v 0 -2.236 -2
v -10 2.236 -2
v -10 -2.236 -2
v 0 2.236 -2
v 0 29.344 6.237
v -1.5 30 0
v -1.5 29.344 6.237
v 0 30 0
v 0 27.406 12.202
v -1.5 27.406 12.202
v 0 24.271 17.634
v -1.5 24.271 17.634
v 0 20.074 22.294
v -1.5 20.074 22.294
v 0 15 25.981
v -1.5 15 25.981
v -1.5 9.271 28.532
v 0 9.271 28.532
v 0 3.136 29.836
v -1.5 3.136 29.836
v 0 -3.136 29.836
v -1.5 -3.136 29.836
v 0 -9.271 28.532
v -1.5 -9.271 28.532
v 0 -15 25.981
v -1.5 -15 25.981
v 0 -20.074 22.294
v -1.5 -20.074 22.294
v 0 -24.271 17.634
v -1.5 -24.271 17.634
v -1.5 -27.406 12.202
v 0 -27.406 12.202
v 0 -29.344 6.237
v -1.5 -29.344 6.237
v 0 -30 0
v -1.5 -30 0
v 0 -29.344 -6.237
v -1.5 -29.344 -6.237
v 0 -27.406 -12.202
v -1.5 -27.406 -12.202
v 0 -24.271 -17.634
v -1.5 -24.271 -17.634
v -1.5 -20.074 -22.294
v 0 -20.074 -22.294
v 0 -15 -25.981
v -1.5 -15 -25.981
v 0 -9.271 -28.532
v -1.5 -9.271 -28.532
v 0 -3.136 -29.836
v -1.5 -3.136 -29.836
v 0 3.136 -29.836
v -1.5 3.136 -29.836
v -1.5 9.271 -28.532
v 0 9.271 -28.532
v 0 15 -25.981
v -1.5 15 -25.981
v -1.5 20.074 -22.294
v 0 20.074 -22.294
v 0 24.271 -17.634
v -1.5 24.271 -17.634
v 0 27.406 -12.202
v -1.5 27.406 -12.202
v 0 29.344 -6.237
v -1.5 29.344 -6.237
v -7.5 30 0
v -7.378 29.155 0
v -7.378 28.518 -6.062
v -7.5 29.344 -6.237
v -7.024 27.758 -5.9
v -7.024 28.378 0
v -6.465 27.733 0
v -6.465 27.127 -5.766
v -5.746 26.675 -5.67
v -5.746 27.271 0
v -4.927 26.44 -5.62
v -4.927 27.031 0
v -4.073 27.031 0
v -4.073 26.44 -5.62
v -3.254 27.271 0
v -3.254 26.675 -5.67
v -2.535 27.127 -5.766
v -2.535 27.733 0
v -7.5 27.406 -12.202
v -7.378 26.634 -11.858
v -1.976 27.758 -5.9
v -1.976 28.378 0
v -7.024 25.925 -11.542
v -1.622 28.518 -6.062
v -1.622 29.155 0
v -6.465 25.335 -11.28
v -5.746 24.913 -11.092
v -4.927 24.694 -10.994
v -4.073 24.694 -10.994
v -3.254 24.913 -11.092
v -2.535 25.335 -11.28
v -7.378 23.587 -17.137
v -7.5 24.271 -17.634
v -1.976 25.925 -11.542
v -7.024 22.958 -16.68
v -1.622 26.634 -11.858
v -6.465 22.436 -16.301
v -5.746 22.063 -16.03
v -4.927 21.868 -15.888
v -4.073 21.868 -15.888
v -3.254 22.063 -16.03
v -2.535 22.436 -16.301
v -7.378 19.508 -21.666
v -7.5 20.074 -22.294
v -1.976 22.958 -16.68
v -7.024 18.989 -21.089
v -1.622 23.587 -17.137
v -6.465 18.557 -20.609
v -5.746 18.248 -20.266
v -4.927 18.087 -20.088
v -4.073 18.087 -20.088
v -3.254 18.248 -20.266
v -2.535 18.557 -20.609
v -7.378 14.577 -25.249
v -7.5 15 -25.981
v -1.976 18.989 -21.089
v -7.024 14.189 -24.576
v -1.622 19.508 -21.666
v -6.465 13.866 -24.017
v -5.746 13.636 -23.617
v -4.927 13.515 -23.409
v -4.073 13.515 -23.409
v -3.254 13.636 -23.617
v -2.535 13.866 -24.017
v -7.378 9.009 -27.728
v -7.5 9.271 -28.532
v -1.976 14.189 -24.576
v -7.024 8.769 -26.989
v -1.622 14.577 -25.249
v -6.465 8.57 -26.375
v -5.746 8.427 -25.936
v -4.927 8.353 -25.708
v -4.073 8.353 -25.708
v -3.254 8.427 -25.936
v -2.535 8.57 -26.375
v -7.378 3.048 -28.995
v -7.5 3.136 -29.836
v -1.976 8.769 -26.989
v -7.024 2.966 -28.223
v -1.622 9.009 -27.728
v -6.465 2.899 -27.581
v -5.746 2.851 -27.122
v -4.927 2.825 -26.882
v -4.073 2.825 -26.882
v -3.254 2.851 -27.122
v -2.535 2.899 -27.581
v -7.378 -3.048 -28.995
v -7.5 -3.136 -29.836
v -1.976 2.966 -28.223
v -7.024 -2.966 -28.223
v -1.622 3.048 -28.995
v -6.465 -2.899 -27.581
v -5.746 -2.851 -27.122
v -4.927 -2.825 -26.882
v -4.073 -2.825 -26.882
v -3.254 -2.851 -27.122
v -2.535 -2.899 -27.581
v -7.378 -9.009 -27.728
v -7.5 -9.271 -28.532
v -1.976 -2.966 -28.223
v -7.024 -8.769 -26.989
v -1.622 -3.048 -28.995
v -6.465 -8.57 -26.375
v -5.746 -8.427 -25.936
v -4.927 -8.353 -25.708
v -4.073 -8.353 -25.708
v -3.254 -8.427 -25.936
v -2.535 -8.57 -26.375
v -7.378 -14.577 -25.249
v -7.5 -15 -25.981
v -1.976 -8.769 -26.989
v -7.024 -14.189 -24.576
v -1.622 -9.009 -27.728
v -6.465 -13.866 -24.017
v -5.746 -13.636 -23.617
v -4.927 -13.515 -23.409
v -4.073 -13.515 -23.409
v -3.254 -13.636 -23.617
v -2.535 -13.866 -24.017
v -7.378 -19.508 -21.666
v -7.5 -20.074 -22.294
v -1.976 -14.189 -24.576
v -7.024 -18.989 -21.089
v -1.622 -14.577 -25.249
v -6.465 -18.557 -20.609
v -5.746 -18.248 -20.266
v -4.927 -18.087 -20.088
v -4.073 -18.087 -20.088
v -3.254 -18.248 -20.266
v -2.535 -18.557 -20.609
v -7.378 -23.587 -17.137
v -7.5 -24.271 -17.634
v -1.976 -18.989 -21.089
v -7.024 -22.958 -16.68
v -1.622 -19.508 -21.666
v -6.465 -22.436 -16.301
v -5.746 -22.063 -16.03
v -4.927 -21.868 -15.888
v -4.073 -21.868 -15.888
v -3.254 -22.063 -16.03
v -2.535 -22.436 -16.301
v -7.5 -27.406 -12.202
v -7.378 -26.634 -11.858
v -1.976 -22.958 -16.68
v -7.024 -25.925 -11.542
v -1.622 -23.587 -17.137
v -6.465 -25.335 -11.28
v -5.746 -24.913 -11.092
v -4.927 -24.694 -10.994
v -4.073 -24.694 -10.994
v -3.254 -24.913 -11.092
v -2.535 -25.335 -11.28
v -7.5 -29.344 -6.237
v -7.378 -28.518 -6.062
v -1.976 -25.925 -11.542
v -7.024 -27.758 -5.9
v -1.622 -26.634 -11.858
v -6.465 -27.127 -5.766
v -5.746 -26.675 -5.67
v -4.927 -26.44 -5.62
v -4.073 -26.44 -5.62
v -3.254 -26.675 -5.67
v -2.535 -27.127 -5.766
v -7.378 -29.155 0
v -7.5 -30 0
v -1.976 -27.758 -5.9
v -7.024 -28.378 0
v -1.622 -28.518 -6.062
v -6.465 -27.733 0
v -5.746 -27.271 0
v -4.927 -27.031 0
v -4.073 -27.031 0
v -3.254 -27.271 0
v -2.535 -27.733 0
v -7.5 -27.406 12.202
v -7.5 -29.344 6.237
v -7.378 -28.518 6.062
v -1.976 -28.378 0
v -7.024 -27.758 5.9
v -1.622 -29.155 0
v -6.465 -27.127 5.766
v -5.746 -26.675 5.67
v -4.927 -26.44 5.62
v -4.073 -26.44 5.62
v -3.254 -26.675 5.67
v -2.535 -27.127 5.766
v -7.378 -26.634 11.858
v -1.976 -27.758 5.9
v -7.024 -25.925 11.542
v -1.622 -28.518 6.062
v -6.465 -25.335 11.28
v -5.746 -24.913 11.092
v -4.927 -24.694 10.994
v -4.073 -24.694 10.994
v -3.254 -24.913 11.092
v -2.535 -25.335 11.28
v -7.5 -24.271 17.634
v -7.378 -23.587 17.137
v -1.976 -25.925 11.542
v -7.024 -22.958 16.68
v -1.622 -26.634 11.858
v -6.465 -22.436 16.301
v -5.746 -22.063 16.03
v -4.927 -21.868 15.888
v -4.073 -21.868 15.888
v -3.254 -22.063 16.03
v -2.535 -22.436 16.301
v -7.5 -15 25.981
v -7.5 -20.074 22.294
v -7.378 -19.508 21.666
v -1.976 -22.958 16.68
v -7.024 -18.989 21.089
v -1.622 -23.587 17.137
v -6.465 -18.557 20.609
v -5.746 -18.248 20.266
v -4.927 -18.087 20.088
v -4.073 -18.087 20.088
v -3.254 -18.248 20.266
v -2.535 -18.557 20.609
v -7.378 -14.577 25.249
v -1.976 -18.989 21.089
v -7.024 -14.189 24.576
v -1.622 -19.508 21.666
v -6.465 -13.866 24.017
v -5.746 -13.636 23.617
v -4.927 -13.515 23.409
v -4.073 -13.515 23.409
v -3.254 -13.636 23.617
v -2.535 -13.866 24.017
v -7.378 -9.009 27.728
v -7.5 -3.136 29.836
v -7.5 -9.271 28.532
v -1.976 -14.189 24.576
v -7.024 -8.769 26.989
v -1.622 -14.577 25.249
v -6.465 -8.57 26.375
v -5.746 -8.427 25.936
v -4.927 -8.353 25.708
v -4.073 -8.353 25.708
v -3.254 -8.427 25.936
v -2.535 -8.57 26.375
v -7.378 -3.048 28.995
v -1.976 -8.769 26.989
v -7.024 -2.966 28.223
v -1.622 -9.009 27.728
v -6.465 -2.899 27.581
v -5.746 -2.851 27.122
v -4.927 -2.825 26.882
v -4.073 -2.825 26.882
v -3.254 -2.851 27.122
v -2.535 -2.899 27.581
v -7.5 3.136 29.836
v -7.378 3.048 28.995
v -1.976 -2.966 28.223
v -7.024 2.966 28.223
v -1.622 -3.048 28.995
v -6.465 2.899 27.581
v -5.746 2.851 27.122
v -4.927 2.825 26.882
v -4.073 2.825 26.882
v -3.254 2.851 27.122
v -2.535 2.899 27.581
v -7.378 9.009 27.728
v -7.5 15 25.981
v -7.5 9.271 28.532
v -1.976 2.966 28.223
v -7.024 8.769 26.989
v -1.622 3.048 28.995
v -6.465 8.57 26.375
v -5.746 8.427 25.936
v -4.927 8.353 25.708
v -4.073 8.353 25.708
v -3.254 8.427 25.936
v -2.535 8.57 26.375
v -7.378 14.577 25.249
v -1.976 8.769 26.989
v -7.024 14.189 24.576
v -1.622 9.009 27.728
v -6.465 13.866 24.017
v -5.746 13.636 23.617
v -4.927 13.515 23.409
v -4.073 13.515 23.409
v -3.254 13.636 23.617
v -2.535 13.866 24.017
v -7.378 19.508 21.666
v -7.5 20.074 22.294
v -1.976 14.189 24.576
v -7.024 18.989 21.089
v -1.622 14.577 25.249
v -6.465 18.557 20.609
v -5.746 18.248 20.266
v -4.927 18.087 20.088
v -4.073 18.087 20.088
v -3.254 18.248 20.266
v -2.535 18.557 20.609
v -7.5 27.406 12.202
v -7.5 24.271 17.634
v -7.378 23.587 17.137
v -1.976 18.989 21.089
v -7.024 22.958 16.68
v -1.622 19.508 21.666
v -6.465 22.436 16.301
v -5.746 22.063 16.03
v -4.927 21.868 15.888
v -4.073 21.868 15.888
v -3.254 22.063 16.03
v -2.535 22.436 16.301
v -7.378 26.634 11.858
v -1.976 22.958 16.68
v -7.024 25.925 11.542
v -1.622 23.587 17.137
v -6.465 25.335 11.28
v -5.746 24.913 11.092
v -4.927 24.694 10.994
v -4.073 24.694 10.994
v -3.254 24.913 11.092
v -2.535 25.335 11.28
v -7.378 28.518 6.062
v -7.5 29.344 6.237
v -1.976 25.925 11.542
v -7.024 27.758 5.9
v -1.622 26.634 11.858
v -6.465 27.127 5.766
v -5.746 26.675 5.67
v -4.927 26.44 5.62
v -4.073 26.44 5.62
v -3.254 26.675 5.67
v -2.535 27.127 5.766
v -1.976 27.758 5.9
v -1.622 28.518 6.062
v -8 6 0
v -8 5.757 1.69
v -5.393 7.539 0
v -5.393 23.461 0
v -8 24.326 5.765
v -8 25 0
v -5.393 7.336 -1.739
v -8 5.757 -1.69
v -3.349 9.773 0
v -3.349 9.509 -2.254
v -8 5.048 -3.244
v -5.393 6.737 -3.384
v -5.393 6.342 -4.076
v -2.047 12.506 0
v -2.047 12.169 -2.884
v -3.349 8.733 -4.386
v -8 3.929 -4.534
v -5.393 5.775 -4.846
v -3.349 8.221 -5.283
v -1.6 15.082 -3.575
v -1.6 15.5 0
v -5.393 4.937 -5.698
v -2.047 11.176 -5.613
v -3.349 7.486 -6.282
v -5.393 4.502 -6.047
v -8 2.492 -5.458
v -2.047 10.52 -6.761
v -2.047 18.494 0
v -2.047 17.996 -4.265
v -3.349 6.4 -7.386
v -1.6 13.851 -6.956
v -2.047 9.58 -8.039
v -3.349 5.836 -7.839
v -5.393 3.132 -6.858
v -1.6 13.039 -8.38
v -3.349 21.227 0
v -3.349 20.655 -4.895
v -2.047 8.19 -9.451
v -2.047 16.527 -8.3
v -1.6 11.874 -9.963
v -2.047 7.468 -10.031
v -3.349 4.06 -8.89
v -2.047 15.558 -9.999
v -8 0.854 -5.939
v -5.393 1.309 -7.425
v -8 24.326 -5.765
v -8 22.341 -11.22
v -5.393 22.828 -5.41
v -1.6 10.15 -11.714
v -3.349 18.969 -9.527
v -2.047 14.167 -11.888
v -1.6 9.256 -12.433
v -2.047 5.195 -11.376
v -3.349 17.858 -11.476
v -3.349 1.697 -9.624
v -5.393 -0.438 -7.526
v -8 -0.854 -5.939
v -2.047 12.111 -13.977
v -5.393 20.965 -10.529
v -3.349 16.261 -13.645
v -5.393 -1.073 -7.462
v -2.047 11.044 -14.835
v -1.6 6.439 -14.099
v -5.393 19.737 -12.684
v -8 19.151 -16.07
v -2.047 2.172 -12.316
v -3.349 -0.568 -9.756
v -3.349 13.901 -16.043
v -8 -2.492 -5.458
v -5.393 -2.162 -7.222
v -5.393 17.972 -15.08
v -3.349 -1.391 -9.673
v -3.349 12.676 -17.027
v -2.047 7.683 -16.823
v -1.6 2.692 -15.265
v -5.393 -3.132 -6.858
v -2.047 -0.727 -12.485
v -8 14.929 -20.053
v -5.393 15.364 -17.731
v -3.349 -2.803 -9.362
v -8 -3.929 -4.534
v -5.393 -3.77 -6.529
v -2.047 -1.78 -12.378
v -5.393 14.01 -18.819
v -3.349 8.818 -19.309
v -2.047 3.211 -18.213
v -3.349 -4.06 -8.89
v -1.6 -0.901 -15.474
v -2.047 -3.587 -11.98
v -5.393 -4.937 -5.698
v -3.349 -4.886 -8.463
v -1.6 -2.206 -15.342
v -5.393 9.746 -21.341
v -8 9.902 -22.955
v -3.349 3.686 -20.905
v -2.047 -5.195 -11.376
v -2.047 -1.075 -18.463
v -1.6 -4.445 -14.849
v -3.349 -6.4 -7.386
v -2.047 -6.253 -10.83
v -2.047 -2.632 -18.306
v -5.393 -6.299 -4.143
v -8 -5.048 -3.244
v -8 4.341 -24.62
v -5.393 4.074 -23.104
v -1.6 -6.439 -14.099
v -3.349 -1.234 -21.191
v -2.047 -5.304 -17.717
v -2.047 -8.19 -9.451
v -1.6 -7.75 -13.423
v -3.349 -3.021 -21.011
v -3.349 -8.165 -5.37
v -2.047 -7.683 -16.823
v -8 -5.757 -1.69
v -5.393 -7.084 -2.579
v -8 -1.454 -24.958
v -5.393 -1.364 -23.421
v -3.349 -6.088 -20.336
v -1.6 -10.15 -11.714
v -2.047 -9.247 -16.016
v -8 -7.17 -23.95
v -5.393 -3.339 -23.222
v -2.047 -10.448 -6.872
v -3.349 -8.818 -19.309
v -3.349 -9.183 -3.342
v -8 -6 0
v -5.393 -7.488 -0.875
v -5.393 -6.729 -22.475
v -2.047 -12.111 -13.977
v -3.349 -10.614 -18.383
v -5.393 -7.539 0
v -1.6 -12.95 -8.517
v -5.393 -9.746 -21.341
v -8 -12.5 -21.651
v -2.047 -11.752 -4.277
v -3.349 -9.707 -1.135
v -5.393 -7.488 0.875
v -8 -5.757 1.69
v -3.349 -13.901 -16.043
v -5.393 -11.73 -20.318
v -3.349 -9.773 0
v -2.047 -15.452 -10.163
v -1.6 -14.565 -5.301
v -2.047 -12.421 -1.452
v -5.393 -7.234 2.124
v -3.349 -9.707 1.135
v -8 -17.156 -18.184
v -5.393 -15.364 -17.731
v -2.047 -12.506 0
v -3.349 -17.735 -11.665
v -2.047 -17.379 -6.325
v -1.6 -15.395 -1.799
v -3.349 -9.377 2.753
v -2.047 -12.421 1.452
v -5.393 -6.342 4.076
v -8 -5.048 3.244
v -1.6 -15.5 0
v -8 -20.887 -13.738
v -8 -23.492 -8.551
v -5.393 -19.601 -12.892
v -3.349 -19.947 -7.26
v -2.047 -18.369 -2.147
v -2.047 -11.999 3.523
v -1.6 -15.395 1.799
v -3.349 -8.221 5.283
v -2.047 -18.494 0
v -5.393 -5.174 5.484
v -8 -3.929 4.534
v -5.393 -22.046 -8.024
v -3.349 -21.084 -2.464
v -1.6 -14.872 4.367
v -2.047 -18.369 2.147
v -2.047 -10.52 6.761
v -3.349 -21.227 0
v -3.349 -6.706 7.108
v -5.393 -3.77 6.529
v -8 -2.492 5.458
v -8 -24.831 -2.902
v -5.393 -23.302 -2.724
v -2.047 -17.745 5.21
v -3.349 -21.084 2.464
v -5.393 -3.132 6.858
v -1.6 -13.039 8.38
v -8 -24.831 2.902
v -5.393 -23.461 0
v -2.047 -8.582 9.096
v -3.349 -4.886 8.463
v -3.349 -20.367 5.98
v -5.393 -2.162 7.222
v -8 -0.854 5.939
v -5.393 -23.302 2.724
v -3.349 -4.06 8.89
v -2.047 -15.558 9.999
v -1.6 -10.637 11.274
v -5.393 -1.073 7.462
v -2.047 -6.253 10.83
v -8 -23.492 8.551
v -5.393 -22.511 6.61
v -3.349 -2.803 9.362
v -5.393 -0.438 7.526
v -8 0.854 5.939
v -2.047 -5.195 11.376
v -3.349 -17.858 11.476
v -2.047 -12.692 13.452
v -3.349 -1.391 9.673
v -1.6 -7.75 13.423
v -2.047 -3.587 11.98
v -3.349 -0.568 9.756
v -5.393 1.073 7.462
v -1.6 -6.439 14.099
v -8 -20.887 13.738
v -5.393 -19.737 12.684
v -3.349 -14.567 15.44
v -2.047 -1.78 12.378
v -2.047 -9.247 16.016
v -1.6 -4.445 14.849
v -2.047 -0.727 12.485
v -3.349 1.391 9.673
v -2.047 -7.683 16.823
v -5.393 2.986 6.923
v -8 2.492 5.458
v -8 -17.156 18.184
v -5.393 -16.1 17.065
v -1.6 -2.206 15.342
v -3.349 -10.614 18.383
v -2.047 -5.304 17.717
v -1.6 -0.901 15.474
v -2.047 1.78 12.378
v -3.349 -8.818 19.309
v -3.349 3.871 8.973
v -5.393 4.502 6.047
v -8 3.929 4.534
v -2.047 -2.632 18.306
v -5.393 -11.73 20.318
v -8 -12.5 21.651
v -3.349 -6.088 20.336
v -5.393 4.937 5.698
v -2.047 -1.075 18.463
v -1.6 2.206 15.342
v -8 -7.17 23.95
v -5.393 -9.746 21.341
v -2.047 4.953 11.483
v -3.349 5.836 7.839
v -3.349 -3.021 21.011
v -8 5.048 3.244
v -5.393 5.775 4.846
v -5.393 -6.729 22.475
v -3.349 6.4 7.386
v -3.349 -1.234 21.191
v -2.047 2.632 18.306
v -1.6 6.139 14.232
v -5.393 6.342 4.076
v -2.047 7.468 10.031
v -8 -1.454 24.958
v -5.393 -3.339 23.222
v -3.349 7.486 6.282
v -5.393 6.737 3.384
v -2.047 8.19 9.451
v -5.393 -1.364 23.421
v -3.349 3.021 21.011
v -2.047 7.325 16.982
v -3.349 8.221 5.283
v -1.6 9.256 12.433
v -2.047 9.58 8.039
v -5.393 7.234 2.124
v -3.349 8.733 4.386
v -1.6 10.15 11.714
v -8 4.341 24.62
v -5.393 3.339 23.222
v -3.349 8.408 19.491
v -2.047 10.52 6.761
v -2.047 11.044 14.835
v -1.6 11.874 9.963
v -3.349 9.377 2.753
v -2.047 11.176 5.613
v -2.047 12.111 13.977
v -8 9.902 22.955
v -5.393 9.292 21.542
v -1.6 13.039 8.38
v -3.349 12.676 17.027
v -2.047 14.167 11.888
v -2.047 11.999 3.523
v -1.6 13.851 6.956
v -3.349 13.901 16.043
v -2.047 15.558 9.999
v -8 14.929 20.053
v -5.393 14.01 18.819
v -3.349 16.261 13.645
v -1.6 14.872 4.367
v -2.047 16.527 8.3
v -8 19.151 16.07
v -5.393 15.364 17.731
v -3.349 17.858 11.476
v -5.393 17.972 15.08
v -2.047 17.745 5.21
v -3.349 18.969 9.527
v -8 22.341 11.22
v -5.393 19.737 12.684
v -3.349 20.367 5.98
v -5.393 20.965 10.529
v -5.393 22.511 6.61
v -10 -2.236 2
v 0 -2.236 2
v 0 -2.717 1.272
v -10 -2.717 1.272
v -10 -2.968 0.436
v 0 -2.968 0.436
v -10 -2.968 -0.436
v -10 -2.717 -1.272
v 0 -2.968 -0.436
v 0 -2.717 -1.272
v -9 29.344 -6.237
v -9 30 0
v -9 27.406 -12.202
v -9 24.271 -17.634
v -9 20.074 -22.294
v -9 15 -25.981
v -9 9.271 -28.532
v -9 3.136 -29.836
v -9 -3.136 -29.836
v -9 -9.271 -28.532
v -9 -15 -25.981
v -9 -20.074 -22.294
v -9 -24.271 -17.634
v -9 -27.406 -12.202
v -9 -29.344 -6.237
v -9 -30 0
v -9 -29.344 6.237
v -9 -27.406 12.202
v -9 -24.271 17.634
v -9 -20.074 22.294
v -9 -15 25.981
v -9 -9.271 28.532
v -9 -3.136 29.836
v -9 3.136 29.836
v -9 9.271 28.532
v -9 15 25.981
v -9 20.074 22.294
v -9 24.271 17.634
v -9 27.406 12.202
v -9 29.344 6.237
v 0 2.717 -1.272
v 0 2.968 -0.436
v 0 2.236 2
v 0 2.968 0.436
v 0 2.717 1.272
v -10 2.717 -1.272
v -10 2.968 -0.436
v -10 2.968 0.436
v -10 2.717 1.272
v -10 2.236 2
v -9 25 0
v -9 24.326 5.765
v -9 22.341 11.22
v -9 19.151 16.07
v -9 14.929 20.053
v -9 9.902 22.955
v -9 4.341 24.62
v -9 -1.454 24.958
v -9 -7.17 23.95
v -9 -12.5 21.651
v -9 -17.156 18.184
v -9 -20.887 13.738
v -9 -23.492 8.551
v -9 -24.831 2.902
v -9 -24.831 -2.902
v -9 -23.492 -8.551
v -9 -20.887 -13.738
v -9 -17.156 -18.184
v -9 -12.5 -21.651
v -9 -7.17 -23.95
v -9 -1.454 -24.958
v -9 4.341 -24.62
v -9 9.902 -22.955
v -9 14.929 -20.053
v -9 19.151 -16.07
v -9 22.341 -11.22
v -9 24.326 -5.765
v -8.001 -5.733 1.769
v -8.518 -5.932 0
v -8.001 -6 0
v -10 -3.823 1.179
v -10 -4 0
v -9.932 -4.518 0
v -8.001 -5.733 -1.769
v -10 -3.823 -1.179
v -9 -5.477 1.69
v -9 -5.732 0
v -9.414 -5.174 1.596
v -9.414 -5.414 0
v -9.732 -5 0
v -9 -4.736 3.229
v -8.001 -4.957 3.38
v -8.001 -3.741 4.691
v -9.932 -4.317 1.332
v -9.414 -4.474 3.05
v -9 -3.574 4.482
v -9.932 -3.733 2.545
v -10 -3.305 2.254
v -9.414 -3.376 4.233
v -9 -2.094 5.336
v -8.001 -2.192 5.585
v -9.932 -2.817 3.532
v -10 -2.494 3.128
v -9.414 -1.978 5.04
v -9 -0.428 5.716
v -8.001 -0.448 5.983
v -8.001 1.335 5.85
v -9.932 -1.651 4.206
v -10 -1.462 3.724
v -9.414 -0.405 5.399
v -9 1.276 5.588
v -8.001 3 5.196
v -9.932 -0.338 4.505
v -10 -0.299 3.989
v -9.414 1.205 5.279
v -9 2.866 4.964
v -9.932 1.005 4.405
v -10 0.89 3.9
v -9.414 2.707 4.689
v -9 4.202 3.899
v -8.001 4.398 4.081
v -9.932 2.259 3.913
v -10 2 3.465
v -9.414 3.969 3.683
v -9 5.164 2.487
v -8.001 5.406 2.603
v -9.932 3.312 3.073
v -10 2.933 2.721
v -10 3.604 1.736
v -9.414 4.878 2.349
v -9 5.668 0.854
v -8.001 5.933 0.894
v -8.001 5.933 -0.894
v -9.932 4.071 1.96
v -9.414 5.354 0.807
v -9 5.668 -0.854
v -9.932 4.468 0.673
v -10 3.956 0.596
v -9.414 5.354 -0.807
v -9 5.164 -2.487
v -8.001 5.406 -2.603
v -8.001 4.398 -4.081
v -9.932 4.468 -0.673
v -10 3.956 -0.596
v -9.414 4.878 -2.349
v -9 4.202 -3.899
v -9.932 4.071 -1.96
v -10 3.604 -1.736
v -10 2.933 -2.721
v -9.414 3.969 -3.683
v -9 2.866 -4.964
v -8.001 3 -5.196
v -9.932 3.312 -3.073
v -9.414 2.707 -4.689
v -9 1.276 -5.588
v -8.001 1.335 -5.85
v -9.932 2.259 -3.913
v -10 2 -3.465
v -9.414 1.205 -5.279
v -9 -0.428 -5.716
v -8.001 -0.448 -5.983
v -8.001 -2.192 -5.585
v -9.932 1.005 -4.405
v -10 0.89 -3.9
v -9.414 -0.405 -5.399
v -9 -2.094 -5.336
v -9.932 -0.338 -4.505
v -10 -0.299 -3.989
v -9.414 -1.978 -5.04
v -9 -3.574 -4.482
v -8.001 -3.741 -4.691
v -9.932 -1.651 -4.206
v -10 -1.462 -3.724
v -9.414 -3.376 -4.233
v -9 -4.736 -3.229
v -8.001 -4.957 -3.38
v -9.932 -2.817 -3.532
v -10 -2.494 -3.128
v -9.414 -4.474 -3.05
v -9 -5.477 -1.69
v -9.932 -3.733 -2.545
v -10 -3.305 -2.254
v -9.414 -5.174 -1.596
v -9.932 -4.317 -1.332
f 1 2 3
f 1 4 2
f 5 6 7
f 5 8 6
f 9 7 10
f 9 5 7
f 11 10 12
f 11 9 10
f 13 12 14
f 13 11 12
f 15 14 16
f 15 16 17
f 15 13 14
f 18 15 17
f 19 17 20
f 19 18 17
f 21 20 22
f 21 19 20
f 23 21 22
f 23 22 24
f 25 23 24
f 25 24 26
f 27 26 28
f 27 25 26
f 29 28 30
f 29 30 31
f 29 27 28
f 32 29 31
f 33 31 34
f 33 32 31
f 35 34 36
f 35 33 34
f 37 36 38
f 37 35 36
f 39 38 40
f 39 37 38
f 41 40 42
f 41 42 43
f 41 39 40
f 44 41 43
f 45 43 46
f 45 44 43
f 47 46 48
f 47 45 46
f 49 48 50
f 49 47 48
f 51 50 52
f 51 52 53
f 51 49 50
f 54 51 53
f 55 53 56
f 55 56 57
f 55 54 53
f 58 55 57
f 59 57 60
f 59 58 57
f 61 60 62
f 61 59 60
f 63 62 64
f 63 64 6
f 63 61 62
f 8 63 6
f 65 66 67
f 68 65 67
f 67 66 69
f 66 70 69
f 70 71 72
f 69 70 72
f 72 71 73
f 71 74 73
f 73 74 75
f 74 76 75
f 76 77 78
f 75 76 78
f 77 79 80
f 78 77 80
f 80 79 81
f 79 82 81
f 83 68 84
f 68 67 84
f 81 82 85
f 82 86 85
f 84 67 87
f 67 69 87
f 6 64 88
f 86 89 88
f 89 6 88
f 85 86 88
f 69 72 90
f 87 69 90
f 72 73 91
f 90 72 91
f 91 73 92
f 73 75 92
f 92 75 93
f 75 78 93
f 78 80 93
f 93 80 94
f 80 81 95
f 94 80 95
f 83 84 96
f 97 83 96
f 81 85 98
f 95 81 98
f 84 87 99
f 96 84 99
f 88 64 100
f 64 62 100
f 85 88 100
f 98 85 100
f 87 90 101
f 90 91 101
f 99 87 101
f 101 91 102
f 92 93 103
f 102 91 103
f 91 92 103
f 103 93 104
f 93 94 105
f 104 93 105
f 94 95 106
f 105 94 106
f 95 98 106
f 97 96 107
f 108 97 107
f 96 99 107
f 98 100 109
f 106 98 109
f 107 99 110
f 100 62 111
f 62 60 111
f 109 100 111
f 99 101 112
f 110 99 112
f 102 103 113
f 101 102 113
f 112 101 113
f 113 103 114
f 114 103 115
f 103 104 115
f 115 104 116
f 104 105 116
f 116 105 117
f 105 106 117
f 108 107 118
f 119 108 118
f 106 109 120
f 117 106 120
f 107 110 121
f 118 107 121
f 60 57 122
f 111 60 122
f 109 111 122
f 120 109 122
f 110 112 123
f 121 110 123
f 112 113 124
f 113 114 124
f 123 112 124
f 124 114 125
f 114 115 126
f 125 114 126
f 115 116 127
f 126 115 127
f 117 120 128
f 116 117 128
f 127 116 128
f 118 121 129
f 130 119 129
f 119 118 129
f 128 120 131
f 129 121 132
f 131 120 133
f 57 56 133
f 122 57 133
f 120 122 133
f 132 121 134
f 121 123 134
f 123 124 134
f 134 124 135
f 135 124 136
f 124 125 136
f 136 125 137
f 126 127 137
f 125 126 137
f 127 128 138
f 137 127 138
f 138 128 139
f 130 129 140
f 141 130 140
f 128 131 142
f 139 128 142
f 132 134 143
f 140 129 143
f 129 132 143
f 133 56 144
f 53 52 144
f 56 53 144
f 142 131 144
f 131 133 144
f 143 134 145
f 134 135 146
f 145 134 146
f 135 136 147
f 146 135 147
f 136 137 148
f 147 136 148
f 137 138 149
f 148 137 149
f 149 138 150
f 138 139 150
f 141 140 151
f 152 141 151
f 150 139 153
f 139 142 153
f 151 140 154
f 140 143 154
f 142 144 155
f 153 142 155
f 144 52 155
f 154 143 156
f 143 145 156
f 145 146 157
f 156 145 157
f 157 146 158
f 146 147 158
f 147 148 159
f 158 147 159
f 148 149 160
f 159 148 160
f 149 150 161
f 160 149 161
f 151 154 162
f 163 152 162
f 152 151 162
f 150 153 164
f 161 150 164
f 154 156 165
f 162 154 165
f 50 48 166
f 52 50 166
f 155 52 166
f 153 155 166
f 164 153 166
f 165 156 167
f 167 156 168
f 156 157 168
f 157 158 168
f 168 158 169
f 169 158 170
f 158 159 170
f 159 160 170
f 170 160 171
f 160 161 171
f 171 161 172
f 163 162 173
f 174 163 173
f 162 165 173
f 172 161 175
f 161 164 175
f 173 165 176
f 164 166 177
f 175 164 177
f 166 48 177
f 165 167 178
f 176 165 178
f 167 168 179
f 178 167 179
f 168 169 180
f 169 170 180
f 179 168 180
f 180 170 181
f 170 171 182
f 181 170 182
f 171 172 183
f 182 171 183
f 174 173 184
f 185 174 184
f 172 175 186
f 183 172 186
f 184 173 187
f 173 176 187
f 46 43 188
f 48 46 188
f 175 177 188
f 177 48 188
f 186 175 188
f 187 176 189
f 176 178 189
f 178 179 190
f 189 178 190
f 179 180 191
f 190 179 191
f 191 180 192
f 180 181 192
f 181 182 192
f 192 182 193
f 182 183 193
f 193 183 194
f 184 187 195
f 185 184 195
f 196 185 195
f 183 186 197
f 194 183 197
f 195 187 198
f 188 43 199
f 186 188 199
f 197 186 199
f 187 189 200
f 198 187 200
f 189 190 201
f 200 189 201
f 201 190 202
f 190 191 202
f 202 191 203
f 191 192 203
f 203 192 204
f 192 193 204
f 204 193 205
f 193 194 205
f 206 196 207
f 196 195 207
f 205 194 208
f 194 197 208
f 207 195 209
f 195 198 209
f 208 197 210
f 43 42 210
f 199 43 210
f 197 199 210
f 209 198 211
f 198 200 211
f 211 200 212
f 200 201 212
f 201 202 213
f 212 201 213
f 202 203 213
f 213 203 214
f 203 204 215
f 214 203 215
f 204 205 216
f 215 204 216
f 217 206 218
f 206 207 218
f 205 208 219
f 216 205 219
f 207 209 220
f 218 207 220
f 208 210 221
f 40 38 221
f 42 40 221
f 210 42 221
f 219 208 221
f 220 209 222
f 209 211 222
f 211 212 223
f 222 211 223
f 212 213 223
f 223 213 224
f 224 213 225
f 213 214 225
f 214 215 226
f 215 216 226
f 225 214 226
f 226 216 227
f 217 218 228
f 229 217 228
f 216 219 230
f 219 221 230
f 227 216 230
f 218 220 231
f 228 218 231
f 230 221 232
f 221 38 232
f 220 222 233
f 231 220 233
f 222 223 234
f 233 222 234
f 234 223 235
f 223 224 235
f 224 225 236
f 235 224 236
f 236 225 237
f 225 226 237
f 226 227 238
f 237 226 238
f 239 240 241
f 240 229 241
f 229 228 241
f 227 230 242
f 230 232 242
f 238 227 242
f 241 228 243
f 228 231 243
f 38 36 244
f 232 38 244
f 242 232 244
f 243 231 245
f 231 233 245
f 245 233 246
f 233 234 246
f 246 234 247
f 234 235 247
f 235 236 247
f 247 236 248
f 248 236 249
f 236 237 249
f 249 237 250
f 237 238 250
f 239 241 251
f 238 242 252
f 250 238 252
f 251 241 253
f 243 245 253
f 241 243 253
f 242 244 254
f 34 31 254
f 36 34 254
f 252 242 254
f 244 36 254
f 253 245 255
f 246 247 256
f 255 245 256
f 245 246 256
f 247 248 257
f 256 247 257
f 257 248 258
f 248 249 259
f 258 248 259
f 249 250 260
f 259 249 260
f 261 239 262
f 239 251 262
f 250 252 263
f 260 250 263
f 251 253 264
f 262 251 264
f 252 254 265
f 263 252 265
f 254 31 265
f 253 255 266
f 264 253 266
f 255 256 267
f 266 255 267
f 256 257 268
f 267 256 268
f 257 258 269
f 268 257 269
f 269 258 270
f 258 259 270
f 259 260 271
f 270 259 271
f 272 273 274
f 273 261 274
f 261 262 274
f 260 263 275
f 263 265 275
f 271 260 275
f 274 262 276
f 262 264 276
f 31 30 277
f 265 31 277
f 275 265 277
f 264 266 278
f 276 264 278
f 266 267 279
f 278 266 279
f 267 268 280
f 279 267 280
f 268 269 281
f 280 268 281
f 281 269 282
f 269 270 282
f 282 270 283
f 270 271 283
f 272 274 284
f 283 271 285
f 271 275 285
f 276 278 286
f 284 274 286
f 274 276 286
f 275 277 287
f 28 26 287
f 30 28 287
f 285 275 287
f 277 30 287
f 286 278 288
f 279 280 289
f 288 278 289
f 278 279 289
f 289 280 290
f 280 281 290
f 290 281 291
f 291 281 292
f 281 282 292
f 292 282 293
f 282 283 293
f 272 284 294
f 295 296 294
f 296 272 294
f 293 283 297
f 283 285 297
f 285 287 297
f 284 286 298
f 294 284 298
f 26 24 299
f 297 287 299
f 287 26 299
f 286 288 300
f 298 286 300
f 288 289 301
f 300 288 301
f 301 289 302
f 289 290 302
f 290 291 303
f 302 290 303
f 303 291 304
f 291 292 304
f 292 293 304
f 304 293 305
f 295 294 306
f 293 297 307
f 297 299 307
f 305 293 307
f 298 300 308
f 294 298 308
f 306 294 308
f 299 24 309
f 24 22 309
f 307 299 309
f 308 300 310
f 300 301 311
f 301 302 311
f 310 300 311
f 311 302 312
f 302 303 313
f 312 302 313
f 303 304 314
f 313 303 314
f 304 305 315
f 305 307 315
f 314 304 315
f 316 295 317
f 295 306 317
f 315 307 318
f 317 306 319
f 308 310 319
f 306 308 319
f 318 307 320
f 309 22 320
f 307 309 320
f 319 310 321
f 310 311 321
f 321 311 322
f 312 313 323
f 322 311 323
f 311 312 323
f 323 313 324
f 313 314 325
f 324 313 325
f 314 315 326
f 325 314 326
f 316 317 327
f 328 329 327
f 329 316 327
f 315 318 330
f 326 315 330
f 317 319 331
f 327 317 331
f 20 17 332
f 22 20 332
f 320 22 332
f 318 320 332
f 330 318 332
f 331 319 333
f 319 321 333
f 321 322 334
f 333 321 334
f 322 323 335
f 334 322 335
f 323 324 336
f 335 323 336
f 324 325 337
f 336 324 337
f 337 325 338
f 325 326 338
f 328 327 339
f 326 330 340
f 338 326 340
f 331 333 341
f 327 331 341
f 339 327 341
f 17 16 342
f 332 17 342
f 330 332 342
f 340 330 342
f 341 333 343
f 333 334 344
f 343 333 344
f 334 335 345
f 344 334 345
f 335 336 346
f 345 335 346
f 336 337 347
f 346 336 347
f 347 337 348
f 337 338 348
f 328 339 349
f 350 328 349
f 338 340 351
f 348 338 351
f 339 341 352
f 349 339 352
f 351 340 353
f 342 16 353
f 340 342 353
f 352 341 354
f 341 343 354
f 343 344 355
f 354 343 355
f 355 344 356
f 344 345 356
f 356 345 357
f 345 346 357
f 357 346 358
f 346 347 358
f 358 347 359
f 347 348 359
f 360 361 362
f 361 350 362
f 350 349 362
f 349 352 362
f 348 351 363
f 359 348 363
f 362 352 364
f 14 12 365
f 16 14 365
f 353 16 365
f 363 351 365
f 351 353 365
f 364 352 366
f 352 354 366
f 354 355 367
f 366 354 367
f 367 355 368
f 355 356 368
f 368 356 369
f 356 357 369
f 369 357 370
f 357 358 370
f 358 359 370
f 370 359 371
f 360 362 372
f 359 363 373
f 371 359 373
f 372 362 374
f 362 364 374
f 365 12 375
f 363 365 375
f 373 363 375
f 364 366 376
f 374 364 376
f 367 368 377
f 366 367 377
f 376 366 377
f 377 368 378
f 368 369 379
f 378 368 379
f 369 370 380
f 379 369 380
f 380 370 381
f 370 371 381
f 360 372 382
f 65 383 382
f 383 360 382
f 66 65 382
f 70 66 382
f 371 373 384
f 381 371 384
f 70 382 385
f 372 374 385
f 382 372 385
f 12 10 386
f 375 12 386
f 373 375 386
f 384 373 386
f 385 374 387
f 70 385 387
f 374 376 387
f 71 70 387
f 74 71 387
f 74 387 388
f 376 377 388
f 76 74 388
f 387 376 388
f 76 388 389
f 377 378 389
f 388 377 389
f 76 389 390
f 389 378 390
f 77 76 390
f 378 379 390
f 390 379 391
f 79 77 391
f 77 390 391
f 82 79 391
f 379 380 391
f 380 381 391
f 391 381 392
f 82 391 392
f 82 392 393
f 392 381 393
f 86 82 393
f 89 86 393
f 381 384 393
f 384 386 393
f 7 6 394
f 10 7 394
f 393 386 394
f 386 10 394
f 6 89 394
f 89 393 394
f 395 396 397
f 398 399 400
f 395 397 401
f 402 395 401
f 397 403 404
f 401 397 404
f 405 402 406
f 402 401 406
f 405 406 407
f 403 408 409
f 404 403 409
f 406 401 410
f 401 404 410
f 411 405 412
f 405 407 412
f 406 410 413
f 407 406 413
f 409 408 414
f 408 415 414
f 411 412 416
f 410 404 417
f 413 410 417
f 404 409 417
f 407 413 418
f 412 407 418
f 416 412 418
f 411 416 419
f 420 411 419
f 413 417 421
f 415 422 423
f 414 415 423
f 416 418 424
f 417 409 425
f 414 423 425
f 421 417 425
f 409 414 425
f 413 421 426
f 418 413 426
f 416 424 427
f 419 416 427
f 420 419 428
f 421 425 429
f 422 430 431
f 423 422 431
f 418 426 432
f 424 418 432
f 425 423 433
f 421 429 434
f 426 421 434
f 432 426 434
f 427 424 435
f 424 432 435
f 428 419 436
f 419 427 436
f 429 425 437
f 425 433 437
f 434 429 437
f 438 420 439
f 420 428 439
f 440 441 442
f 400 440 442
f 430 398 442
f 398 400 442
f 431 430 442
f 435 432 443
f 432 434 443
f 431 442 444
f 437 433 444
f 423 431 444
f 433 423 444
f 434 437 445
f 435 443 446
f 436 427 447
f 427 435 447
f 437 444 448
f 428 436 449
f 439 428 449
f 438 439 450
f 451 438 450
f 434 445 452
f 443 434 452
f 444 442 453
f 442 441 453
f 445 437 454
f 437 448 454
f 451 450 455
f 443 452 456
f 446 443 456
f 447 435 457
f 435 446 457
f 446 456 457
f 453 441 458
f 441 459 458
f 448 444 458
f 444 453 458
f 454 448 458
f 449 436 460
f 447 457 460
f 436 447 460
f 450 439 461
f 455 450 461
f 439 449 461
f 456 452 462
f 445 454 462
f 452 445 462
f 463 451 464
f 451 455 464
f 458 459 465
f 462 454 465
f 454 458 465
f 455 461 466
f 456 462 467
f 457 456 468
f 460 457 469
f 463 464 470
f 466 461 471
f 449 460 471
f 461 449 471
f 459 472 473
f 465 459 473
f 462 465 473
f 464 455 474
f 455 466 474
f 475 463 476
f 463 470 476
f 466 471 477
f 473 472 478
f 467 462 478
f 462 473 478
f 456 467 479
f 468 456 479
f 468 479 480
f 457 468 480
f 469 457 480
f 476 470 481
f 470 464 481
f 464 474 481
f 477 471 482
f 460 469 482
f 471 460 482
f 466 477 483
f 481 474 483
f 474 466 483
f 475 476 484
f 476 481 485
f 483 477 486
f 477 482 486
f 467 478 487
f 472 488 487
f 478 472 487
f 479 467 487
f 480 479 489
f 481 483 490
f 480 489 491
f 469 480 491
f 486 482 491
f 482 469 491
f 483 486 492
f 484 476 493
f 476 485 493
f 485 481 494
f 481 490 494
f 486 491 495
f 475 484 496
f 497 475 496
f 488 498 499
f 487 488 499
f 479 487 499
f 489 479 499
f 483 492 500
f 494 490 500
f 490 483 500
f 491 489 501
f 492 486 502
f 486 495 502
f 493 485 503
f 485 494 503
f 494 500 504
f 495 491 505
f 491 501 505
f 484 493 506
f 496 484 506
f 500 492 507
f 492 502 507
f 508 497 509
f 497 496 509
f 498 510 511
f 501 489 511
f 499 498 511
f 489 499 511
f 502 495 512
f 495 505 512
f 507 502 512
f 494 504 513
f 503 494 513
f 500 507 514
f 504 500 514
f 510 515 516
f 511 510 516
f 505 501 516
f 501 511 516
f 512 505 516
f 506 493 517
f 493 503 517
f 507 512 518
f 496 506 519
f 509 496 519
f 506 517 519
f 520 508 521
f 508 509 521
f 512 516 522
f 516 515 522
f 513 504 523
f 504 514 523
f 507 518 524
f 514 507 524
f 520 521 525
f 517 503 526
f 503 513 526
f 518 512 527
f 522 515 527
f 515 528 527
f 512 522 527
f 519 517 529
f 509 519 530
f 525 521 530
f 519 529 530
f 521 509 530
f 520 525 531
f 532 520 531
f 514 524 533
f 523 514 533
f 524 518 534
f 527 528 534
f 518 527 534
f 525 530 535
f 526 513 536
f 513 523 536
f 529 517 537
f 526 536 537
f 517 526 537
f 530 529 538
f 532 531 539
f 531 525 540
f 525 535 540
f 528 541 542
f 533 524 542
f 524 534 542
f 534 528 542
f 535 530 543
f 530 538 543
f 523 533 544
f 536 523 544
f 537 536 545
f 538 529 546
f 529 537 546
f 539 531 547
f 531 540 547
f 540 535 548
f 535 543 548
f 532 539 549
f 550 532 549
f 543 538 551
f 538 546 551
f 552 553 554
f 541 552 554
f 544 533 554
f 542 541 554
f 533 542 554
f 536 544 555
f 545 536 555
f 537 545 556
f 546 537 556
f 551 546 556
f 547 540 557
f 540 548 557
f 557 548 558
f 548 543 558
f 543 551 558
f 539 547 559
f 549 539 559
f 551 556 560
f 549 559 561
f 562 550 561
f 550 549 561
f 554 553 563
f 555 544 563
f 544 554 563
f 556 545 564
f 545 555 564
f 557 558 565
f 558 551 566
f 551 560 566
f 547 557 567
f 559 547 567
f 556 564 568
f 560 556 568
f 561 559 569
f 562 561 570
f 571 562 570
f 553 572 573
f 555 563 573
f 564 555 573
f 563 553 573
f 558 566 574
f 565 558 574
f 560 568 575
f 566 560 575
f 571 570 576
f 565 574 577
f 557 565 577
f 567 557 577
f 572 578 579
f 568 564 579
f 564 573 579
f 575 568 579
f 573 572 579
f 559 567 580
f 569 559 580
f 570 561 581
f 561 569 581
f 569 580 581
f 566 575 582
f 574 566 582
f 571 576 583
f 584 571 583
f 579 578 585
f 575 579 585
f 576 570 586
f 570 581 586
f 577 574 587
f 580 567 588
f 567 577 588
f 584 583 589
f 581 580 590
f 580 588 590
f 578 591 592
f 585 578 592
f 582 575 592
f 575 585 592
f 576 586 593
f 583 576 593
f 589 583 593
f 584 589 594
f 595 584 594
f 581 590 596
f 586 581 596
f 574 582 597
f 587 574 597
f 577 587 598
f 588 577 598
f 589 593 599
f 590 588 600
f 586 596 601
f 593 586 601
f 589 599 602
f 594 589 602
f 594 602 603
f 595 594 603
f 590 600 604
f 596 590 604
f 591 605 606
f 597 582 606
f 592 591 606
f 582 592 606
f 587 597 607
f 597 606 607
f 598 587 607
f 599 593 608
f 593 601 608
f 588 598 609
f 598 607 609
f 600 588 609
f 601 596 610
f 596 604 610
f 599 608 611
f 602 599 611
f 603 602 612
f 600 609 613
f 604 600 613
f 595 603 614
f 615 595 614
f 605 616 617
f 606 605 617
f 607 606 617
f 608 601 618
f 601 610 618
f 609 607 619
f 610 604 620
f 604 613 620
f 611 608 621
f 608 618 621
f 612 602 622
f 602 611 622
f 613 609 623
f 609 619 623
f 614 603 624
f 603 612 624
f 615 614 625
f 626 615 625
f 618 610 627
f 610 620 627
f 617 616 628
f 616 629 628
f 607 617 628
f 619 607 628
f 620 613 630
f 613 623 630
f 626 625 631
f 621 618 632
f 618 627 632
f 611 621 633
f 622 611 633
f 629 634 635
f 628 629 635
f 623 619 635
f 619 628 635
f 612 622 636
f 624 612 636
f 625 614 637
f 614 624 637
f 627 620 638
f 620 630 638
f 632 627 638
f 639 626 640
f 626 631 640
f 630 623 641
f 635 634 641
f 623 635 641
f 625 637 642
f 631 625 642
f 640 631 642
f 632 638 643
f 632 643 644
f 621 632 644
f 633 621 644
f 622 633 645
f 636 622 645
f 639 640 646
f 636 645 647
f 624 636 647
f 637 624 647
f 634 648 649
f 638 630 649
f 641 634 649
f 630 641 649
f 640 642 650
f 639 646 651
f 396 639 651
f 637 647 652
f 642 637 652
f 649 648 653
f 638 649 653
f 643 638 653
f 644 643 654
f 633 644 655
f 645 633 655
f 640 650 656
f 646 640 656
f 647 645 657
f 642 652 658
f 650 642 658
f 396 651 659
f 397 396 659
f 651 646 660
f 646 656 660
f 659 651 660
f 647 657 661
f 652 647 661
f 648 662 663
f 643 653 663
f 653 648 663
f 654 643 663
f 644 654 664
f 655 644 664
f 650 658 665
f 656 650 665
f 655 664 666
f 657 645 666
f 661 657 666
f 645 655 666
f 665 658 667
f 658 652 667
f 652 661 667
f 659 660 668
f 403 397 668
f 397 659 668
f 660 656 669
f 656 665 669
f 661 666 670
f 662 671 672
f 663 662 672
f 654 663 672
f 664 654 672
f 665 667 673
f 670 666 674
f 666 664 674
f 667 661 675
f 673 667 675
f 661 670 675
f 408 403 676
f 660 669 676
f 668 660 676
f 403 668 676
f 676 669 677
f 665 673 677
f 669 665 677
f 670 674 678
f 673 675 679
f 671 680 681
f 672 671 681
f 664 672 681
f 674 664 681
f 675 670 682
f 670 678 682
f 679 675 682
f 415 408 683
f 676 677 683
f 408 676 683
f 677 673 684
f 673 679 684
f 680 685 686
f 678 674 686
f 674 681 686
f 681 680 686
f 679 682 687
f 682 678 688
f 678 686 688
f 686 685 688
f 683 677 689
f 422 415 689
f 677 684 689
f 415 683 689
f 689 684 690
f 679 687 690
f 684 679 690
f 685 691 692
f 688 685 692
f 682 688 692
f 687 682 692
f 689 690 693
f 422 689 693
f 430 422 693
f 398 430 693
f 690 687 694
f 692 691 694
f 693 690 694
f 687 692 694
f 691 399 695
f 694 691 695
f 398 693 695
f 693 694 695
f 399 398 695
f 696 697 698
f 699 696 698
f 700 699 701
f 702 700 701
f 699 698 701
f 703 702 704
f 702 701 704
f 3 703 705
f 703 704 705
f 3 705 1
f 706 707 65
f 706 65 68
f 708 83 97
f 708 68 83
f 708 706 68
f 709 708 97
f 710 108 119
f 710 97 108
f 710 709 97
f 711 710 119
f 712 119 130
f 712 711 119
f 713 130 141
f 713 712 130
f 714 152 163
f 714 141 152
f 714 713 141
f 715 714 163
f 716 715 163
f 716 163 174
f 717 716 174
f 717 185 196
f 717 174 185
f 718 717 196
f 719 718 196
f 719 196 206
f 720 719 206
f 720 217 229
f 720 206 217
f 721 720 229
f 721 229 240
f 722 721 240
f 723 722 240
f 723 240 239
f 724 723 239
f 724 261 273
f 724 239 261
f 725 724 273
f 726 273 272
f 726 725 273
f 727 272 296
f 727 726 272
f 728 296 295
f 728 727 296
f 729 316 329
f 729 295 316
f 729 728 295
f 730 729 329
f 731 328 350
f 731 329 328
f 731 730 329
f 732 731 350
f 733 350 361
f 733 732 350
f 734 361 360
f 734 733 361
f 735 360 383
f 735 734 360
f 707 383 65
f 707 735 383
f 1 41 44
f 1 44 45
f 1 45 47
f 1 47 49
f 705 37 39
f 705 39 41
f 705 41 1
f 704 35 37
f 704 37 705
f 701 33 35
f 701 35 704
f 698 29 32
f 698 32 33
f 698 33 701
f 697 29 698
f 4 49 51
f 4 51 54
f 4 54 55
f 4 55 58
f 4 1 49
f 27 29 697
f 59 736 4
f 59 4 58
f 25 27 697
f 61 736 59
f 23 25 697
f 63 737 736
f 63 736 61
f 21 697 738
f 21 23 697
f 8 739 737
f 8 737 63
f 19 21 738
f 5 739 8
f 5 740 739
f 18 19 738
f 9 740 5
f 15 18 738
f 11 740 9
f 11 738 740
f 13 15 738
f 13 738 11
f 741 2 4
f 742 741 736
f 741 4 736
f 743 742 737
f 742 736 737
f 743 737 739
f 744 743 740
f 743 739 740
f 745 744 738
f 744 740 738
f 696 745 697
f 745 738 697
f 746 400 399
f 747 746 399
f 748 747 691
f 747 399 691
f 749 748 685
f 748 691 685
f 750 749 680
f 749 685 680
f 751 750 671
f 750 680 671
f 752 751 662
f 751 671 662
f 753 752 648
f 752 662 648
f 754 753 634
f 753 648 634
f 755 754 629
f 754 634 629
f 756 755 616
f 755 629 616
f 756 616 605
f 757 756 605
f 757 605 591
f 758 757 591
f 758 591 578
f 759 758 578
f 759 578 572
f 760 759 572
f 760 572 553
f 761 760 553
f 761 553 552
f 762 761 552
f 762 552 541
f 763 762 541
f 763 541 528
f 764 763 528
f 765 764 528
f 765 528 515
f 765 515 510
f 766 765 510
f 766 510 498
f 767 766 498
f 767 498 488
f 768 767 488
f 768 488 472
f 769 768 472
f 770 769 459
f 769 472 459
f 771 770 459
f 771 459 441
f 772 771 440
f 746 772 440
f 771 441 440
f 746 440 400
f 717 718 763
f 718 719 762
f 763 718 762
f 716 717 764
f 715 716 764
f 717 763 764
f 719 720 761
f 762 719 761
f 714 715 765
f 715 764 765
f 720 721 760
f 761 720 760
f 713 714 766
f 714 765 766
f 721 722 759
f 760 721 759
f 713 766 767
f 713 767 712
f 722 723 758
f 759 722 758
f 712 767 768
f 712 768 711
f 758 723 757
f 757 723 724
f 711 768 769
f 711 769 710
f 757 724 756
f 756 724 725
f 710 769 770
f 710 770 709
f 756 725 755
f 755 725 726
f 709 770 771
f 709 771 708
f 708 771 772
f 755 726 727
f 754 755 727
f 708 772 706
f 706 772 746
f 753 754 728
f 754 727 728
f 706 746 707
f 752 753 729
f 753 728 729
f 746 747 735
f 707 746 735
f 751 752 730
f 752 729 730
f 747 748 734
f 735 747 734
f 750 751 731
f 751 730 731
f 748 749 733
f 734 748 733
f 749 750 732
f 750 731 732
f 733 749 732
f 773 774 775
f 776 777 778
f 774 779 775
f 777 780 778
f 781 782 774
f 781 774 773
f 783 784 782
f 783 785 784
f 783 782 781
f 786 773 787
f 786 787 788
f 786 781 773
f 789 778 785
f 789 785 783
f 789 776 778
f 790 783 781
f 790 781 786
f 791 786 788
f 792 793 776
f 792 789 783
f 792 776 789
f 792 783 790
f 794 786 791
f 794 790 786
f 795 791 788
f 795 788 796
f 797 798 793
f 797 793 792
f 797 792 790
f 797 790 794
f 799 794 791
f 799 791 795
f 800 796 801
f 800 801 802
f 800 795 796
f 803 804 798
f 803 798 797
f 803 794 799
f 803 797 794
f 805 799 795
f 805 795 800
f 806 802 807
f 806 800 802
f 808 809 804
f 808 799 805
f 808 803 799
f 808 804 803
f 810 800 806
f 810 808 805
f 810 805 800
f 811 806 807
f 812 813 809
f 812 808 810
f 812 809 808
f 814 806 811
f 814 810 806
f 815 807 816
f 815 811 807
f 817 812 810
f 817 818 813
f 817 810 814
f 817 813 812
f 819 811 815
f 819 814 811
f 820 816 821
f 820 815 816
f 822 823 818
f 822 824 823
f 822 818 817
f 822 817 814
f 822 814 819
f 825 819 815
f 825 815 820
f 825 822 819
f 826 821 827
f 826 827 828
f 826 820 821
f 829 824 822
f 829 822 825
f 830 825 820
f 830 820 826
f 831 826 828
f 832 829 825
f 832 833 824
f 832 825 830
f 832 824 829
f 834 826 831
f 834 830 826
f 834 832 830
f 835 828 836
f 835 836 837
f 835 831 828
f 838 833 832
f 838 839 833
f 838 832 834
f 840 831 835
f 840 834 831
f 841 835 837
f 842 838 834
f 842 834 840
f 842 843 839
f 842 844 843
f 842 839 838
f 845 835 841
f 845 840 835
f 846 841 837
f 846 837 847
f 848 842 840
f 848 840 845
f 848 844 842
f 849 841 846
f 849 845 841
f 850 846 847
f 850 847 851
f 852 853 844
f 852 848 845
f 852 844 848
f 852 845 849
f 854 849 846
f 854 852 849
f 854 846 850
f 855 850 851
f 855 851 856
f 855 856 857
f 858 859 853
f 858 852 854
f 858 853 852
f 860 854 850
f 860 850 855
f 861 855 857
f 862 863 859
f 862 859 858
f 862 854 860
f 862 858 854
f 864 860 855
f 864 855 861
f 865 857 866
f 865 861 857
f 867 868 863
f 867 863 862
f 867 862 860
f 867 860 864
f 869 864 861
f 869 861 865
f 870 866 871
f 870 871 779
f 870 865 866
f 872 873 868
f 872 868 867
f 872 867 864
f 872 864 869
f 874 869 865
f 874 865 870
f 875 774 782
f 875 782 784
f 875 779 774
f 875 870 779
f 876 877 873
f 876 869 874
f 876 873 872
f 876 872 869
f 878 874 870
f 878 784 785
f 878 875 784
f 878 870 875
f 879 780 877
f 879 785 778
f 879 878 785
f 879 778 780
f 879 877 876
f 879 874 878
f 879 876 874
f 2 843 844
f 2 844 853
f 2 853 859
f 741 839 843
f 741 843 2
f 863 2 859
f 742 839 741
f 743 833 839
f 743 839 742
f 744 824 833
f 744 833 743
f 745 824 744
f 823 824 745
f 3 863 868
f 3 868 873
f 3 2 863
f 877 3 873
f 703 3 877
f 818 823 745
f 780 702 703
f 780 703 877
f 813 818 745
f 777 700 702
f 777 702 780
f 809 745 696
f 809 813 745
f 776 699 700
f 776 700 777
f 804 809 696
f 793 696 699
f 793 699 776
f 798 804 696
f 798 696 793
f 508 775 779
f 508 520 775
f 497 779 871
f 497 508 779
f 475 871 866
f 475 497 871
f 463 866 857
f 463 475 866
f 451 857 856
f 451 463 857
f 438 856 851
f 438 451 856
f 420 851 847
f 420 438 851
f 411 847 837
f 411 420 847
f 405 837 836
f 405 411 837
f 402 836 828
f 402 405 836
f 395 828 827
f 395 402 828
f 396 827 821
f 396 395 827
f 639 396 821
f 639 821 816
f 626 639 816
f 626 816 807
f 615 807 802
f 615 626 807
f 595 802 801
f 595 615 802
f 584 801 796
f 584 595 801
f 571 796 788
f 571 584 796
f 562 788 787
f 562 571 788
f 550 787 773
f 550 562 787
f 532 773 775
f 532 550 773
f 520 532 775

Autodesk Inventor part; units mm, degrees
ref_plane "YZ Plane" through (0, 0, 0) normal (1, 0, 0) x (0, 1, 0)
ref_plane "XZ Plane" through (0, 0, 0) normal (0, 1, 0) x (-1, 0, 0)
sketch "Esboço1" plane through (0, 0, 0) normal (0, 0, 1) x (1, 0, 0)
  line L0 (0, 0) -> (0, 30)
  line L1 (0, 3) -> (-8, 3)
  line L2 (0, 0) -> (2.8421, 0)
  circle A0 centre (-4.5, 30) radius 3
  line L3 (-1.5, 30) -> (0, 30)
  line L4 (-7.5, 30) -> (-9, 30)
  line L5 (-8, 3) -> (-8, 6)
  line L6 (-9, 30) -> (-9, 25)
  line L7 (-9, 25) -> (-8, 25)
  arc A1 (-8, 6) -> (-8, 25) centre (-11.8508, 15.5) ccw
  point P0 (0, 15)
  point P1 (-1.6, 15.5)
  dimension "d1" = 3
  dimension "d3" = 6
  dimension "d4" = 1.5
  dimension "d7" = 1.5
  dimension "d15" = 8
  dimension "d79" = 0
  dimension "d80" = 0
  dimension "d81" = 30
  dimension "d93" = 5
  dimension "d94" = 3
  dimension "d95" = 1.6
revolve "Revolução1" add sketch "Esboço1" angle 360 about axis through (0, 0, 0) along (1, 0, 0) contours L1 L5 A1 L7 L6 L4 A0 L3 L0
sketch "Esboço3" plane through (-8, 0, 0) normal (-1, 0, 0) x (0, -1, 0)
  circle A0 centre (0, 0) radius 3 projected
  arc A1 (-2.2361, -2) -> (0, -3) centre (0, 0) ccw
  arc A2 (-2.2361, -2) -> (2.2361, -2) centre (0, 0) ccw
  line L0 (-2.2361, 2) -> (2.2361, 2)
  line L1 (-2.2361, -2) -> (2.2361, -2)
  dimension "d84" = 4
sketch "Esboço6" plane through (-8, 0, 0) normal (-1, 0, 0) x (0, -1, 0)
  circle A0 centre (0, 0) radius 6 projected
  circle A1 centre (0, 0) radius 3
ref_plane "Plano de trabalho4" through (-4.5, 0, 0) normal (-1, 0, 0) x (0, 0, 1)
extrude "Extrusão9" add sketch "Esboço3" along normal blind 2 and the other way blind 8 contours L0 A0 | A0 L1
extrude "Extrusão10" add sketch "Esboço6" along normal blind 2
fillet "Arredondamento13" radius 2 1 edges at (-10, 6, 0)
equation "\"d23\" = d22"
equation "\"d22\" = 10deg"
properties part number "Rodinha-01"
